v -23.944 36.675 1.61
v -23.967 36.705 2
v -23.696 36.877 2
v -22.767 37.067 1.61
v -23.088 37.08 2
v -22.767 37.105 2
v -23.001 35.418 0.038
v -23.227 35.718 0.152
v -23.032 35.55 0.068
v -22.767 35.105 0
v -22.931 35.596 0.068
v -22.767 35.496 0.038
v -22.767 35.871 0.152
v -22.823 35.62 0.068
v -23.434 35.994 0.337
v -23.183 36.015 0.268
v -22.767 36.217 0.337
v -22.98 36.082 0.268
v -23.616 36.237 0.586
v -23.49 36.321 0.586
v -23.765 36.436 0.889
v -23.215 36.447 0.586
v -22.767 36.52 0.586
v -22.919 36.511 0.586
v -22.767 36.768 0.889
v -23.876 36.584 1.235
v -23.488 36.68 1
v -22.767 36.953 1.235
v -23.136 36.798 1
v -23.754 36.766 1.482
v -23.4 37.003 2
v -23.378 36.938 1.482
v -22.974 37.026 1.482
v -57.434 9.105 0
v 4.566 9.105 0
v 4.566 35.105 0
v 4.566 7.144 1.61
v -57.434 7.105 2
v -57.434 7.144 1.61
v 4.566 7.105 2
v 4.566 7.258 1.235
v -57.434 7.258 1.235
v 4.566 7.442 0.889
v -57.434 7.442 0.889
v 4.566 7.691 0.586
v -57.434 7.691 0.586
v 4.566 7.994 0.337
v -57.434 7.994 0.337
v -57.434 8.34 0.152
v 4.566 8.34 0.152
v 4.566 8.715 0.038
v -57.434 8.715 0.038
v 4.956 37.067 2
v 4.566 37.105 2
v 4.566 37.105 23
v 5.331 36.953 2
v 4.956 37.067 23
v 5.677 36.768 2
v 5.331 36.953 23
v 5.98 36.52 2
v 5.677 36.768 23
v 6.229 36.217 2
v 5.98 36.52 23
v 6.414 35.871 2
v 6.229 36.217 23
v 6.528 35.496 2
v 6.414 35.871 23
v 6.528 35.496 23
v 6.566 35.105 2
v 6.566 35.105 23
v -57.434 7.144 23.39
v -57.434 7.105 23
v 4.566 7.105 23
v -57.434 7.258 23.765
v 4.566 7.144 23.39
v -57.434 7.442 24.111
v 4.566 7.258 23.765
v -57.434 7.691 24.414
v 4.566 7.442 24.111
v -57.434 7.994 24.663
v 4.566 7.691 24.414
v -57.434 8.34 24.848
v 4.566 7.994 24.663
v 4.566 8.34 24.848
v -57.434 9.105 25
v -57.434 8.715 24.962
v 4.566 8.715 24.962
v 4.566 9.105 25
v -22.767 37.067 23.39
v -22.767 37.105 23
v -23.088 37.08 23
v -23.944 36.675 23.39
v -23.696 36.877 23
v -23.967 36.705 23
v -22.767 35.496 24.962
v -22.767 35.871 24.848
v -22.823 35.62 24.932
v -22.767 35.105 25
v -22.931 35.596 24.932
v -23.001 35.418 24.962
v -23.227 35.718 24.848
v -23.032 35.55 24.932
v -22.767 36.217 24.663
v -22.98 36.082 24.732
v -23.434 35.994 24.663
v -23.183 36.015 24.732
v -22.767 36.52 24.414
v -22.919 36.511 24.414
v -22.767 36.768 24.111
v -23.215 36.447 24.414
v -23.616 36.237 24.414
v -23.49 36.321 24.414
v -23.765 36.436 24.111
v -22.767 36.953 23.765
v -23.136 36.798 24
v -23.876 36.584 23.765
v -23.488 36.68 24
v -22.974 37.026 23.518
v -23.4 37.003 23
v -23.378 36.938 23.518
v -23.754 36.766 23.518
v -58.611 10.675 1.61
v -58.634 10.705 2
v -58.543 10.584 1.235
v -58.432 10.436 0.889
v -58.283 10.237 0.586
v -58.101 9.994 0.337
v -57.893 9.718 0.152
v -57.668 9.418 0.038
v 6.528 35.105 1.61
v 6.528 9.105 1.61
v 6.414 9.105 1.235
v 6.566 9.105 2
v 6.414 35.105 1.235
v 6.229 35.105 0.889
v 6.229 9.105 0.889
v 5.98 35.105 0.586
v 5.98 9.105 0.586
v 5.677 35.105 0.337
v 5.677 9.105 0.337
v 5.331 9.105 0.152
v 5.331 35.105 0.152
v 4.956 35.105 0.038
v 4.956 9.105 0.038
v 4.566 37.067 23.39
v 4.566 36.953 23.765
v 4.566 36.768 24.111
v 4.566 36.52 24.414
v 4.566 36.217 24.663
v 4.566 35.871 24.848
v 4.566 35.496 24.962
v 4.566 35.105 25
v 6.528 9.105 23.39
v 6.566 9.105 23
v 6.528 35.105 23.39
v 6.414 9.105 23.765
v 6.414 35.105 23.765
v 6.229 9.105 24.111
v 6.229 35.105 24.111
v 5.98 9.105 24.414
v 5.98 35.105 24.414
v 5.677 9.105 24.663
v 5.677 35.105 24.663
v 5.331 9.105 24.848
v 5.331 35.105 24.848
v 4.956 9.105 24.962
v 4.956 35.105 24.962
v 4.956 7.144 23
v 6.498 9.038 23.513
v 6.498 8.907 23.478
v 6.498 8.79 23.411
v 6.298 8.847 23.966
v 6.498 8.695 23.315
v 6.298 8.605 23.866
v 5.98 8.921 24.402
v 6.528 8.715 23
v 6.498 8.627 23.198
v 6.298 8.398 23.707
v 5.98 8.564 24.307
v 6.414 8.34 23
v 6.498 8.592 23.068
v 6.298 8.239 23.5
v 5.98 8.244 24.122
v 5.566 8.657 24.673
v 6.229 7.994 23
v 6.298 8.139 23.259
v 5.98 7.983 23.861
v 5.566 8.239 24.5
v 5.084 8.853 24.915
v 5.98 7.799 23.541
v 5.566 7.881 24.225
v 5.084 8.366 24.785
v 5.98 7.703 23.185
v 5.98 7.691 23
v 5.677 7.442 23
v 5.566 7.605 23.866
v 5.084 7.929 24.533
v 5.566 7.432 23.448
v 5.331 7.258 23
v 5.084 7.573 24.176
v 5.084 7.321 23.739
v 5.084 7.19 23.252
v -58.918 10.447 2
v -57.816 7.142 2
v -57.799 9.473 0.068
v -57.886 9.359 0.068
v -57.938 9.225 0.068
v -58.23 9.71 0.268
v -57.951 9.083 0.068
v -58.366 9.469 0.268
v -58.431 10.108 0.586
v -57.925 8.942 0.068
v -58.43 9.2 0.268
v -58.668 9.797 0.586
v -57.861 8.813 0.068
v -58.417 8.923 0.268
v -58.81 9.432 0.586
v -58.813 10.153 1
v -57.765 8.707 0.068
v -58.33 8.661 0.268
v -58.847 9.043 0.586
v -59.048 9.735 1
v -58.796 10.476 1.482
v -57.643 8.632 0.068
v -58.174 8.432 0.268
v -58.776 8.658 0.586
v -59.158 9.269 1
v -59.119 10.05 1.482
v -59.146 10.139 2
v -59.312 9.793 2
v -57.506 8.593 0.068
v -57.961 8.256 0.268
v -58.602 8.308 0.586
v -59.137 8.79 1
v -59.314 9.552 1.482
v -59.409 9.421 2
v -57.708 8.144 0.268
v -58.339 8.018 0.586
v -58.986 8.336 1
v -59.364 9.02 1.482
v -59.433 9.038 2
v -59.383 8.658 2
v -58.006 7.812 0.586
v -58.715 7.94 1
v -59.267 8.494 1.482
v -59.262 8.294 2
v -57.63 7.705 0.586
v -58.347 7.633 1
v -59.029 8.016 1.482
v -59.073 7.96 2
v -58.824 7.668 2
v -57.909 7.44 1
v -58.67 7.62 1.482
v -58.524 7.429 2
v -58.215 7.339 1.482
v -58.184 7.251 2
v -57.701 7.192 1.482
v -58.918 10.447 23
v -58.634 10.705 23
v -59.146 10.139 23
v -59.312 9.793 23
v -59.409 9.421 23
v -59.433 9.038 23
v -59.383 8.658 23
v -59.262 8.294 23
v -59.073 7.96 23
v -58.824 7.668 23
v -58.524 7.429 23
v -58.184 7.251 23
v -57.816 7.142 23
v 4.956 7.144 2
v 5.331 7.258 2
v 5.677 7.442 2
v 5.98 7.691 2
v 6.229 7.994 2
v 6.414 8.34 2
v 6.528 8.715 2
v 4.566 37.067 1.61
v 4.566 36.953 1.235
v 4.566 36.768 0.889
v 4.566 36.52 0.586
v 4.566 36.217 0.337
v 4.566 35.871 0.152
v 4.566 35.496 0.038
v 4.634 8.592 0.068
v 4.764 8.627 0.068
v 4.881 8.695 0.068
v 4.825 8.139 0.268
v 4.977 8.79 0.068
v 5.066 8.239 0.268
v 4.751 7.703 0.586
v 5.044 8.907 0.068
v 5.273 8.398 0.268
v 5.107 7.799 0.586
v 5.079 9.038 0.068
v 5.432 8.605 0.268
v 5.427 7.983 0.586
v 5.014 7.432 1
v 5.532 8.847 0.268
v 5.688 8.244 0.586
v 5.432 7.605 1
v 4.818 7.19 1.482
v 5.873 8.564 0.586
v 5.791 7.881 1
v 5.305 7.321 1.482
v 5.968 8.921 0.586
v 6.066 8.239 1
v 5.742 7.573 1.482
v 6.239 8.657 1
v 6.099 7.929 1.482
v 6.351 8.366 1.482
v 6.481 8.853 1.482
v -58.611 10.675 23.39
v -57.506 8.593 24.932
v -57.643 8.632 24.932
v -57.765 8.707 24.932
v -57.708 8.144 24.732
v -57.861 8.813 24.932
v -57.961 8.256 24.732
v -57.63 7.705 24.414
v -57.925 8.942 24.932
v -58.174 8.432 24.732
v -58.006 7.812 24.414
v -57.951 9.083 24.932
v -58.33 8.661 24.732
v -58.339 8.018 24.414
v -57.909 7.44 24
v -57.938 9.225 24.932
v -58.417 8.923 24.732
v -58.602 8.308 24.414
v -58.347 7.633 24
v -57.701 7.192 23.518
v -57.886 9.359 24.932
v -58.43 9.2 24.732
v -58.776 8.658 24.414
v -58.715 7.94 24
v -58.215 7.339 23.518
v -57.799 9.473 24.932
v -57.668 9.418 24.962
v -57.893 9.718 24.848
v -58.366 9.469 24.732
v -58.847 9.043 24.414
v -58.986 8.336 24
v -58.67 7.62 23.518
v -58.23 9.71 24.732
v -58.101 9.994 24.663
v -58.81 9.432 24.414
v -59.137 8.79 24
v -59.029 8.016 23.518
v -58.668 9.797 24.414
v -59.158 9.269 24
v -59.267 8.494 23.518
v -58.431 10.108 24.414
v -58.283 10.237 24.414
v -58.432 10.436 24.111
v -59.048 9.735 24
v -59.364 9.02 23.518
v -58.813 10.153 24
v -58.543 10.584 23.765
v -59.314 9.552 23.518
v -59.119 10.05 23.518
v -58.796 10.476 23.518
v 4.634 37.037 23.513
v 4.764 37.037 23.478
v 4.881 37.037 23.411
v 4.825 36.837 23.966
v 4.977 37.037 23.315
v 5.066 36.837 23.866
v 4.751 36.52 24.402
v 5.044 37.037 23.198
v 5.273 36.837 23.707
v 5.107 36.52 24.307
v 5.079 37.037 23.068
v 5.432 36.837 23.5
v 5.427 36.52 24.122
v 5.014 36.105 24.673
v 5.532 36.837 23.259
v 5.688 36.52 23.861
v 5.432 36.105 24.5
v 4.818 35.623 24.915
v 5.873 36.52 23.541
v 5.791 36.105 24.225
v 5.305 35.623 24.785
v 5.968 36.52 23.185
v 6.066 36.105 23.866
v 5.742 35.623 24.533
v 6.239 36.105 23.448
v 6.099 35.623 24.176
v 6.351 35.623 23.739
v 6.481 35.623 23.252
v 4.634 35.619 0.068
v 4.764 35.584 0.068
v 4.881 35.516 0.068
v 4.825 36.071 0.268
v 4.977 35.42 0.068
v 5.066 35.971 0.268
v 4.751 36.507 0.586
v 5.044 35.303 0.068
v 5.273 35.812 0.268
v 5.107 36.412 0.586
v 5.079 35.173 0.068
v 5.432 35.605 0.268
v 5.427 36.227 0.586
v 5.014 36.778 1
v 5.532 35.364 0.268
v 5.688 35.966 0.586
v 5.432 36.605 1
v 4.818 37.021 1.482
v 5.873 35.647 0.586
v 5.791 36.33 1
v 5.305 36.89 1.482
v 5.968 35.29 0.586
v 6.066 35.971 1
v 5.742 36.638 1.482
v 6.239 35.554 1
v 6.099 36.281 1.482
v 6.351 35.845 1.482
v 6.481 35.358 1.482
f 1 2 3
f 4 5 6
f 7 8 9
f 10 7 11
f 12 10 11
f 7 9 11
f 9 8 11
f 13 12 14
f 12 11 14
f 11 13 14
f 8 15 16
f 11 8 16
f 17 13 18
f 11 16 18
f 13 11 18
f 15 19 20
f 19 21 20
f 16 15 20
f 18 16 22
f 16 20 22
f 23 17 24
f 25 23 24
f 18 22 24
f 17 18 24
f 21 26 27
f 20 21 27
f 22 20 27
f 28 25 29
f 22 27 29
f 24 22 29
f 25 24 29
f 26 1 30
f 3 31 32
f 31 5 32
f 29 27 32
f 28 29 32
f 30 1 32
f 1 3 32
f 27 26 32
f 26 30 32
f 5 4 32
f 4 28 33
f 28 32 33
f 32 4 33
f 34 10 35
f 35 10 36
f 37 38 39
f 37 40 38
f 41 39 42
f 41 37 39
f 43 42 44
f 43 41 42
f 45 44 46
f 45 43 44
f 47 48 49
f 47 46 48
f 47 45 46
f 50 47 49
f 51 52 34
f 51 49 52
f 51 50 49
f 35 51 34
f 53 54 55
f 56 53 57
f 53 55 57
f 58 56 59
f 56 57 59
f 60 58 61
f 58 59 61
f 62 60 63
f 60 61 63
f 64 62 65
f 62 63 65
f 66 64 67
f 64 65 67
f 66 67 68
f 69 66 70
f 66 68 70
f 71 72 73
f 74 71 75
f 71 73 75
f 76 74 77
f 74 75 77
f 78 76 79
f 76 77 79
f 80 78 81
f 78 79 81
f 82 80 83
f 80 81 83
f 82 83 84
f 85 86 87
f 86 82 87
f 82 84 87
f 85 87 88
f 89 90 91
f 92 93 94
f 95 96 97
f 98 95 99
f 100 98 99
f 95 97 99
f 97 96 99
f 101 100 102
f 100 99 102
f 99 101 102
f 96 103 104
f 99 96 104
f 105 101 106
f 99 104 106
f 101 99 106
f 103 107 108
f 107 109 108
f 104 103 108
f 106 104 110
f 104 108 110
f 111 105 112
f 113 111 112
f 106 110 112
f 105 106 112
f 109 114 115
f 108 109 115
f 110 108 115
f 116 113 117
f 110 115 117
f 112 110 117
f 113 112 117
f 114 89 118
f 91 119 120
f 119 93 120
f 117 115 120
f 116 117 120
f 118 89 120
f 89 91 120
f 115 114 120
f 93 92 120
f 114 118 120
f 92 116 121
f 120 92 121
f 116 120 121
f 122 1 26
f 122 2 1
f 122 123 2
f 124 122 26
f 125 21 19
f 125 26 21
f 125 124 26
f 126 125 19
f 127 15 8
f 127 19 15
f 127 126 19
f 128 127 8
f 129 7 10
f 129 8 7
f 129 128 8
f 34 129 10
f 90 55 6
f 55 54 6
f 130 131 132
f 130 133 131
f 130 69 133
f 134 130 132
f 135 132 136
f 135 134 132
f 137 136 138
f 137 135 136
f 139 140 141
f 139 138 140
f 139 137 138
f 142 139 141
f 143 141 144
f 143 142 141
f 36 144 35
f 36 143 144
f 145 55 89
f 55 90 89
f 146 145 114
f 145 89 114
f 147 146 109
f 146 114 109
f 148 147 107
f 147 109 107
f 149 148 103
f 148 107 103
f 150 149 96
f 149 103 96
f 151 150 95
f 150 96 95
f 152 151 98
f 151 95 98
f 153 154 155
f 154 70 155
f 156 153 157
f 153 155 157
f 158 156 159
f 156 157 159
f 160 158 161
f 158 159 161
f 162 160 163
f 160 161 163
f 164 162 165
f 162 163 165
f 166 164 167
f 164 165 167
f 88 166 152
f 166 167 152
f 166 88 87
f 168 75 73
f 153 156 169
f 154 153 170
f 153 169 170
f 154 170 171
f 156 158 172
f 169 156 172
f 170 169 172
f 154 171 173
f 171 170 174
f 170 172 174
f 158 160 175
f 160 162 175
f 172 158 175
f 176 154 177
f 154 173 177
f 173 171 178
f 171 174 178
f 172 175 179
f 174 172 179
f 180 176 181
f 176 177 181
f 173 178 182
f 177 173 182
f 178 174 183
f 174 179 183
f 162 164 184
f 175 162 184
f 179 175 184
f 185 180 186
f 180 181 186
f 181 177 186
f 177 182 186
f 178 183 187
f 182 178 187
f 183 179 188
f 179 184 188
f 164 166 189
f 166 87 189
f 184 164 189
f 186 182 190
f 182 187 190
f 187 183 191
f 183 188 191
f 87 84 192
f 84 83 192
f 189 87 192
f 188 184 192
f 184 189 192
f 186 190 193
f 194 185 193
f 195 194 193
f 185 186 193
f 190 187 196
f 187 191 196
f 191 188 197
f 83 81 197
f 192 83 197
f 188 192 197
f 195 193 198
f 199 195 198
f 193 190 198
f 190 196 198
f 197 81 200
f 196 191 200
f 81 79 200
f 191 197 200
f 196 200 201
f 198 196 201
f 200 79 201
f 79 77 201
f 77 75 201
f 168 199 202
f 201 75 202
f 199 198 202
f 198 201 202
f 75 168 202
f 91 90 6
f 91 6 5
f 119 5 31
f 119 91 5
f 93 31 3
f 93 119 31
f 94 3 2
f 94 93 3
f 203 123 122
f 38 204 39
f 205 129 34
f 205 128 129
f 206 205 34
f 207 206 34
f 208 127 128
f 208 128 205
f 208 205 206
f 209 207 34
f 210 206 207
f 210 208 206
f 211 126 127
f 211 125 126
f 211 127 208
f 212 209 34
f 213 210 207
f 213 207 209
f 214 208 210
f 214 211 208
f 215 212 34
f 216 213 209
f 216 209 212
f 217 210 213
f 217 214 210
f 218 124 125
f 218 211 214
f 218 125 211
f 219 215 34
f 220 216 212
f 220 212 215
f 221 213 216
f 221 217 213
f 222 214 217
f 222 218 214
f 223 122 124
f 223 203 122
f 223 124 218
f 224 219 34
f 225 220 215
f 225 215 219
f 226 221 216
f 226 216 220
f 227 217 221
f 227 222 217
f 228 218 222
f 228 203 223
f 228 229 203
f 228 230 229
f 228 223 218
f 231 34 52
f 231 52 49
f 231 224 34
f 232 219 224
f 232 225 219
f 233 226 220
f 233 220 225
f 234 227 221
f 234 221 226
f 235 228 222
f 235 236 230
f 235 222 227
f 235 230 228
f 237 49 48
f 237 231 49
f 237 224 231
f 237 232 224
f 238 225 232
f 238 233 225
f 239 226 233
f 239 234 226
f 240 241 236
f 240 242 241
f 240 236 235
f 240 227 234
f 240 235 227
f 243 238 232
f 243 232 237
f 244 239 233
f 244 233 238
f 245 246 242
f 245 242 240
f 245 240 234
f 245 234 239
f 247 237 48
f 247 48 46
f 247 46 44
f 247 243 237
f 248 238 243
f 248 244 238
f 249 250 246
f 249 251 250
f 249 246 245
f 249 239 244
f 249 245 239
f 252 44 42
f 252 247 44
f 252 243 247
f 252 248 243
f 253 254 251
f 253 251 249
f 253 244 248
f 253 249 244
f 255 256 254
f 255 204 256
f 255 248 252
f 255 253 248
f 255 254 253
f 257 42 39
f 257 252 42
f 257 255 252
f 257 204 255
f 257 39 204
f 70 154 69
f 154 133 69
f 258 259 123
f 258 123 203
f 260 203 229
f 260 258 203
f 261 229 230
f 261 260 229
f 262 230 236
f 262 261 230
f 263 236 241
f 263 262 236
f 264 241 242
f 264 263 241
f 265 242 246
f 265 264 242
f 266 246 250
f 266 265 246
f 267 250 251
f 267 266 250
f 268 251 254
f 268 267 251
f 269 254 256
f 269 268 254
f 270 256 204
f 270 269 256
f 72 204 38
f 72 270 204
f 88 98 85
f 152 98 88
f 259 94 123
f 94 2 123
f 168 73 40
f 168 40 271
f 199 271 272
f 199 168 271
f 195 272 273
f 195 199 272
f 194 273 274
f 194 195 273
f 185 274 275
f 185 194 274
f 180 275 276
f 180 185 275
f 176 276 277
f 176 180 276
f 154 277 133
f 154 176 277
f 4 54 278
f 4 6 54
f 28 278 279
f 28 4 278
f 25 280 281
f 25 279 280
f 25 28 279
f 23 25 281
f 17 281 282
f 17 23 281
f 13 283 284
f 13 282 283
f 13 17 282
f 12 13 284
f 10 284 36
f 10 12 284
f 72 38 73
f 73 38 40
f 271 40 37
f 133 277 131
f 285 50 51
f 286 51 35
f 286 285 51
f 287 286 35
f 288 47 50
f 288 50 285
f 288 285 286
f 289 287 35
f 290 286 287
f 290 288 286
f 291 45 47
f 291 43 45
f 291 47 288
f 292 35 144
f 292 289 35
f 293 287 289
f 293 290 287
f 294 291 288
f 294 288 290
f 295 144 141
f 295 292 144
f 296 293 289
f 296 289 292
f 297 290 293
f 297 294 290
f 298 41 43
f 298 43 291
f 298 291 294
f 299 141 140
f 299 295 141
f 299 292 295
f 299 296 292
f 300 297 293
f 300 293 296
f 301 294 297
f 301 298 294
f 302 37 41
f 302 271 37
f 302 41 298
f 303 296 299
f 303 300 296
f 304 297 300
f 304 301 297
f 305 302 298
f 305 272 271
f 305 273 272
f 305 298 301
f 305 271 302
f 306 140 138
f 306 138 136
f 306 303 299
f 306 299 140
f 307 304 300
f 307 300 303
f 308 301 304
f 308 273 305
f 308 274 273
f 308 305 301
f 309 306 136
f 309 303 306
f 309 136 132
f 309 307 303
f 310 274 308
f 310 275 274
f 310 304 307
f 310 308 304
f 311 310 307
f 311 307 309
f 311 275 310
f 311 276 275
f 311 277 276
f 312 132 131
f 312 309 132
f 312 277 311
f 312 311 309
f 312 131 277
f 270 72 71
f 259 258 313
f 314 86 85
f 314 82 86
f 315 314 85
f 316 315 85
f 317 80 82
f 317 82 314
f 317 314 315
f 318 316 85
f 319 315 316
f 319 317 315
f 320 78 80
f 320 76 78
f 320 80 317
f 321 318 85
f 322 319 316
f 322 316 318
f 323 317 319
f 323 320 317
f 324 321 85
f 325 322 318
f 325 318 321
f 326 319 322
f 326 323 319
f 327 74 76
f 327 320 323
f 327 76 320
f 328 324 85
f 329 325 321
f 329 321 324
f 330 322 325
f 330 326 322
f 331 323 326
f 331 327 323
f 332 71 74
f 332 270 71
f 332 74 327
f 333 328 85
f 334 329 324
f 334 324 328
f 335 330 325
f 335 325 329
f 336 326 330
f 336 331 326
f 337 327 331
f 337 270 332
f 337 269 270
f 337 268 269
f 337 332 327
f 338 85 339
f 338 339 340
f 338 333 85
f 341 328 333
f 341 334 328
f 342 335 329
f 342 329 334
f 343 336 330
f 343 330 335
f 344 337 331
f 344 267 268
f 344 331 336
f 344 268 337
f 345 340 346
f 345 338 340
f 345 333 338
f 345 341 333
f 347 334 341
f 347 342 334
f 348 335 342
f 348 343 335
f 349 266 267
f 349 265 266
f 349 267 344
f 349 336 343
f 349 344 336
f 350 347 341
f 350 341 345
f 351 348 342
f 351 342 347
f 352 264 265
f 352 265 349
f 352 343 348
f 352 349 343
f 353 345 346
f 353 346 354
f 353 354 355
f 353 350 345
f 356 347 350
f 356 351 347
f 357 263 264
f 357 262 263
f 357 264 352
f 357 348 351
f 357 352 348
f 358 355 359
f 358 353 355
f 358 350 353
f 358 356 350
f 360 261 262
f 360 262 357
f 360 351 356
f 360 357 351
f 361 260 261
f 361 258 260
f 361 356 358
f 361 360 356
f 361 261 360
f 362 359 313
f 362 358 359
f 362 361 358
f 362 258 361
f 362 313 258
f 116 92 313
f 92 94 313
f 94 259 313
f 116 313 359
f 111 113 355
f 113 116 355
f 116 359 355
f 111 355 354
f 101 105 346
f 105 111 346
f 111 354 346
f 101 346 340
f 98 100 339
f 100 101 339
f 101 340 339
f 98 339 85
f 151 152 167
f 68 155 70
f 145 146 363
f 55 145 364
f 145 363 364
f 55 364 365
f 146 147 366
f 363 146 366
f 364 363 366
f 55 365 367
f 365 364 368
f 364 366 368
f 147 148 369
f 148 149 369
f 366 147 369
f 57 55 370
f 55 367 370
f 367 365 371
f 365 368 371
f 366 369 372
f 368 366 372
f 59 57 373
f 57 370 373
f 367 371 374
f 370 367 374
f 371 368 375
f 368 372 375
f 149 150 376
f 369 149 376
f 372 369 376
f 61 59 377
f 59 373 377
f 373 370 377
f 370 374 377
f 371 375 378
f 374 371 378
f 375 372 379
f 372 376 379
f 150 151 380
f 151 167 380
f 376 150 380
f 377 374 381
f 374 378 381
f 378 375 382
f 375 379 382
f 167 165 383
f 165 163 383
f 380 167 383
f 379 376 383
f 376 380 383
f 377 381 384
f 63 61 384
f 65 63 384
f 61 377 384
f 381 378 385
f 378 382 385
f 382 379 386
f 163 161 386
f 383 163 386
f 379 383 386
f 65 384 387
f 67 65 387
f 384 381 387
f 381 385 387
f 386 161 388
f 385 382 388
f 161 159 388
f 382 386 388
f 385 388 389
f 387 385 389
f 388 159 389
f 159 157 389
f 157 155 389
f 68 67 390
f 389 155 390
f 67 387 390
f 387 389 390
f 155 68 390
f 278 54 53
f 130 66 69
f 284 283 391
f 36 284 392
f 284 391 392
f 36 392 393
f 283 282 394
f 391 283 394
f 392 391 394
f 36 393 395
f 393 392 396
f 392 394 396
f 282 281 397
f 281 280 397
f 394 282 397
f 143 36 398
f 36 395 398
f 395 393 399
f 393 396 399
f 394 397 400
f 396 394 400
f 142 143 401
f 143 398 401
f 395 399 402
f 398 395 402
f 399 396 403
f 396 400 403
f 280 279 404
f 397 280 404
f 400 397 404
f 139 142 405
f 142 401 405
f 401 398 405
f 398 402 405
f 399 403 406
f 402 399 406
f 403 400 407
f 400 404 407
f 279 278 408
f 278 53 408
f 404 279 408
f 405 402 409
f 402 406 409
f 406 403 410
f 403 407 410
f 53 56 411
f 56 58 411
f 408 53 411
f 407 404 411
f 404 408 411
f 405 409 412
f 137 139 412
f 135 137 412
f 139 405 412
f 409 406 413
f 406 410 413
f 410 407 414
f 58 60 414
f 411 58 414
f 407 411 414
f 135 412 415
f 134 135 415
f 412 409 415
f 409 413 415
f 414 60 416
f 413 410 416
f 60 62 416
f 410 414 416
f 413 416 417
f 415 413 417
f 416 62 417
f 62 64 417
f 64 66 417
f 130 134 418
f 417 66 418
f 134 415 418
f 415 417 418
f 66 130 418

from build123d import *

# Parameters (mm, degrees)
F1_DEPTH = 25
F2_R     = 2


with BuildPart() as f1:
    # F0 (on Top) → F1 (new body)
    with BuildSketch(Plane.XY):
        Polygon((6.565958, 37.105379), (-23.434042, 37.105379), (-63.434042, 7.105379), (-23.434042, 7.105379), (6.565958, 7.105379), align=None)
    extrude(amount=F1_DEPTH)

    # F2
    f2_edges = [f1.edges().sort_by_distance(p)[0] for p in [
        (-28.434042, 7.105379, 25),
        (6.565958, 22.105379, 25),
        (-8.434042, 37.105379, 25),
        (-43.434042, 22.105379, 25),
        (6.565958, 7.105379, 12.5),
        (-28.434042, 7.105379, 0),
        (-63.434042, 7.105379, 12.5),
        (-23.434042, 37.105379, 12.5),
        (-43.434042, 22.105379, 0),
        (6.565958, 37.105379, 12.5),
        (-8.434042, 37.105379, 0),
        (6.565958, 22.105379, 0),
    ]]
    fillet(f2_edges, radius=F2_R)


solid = f1.part
